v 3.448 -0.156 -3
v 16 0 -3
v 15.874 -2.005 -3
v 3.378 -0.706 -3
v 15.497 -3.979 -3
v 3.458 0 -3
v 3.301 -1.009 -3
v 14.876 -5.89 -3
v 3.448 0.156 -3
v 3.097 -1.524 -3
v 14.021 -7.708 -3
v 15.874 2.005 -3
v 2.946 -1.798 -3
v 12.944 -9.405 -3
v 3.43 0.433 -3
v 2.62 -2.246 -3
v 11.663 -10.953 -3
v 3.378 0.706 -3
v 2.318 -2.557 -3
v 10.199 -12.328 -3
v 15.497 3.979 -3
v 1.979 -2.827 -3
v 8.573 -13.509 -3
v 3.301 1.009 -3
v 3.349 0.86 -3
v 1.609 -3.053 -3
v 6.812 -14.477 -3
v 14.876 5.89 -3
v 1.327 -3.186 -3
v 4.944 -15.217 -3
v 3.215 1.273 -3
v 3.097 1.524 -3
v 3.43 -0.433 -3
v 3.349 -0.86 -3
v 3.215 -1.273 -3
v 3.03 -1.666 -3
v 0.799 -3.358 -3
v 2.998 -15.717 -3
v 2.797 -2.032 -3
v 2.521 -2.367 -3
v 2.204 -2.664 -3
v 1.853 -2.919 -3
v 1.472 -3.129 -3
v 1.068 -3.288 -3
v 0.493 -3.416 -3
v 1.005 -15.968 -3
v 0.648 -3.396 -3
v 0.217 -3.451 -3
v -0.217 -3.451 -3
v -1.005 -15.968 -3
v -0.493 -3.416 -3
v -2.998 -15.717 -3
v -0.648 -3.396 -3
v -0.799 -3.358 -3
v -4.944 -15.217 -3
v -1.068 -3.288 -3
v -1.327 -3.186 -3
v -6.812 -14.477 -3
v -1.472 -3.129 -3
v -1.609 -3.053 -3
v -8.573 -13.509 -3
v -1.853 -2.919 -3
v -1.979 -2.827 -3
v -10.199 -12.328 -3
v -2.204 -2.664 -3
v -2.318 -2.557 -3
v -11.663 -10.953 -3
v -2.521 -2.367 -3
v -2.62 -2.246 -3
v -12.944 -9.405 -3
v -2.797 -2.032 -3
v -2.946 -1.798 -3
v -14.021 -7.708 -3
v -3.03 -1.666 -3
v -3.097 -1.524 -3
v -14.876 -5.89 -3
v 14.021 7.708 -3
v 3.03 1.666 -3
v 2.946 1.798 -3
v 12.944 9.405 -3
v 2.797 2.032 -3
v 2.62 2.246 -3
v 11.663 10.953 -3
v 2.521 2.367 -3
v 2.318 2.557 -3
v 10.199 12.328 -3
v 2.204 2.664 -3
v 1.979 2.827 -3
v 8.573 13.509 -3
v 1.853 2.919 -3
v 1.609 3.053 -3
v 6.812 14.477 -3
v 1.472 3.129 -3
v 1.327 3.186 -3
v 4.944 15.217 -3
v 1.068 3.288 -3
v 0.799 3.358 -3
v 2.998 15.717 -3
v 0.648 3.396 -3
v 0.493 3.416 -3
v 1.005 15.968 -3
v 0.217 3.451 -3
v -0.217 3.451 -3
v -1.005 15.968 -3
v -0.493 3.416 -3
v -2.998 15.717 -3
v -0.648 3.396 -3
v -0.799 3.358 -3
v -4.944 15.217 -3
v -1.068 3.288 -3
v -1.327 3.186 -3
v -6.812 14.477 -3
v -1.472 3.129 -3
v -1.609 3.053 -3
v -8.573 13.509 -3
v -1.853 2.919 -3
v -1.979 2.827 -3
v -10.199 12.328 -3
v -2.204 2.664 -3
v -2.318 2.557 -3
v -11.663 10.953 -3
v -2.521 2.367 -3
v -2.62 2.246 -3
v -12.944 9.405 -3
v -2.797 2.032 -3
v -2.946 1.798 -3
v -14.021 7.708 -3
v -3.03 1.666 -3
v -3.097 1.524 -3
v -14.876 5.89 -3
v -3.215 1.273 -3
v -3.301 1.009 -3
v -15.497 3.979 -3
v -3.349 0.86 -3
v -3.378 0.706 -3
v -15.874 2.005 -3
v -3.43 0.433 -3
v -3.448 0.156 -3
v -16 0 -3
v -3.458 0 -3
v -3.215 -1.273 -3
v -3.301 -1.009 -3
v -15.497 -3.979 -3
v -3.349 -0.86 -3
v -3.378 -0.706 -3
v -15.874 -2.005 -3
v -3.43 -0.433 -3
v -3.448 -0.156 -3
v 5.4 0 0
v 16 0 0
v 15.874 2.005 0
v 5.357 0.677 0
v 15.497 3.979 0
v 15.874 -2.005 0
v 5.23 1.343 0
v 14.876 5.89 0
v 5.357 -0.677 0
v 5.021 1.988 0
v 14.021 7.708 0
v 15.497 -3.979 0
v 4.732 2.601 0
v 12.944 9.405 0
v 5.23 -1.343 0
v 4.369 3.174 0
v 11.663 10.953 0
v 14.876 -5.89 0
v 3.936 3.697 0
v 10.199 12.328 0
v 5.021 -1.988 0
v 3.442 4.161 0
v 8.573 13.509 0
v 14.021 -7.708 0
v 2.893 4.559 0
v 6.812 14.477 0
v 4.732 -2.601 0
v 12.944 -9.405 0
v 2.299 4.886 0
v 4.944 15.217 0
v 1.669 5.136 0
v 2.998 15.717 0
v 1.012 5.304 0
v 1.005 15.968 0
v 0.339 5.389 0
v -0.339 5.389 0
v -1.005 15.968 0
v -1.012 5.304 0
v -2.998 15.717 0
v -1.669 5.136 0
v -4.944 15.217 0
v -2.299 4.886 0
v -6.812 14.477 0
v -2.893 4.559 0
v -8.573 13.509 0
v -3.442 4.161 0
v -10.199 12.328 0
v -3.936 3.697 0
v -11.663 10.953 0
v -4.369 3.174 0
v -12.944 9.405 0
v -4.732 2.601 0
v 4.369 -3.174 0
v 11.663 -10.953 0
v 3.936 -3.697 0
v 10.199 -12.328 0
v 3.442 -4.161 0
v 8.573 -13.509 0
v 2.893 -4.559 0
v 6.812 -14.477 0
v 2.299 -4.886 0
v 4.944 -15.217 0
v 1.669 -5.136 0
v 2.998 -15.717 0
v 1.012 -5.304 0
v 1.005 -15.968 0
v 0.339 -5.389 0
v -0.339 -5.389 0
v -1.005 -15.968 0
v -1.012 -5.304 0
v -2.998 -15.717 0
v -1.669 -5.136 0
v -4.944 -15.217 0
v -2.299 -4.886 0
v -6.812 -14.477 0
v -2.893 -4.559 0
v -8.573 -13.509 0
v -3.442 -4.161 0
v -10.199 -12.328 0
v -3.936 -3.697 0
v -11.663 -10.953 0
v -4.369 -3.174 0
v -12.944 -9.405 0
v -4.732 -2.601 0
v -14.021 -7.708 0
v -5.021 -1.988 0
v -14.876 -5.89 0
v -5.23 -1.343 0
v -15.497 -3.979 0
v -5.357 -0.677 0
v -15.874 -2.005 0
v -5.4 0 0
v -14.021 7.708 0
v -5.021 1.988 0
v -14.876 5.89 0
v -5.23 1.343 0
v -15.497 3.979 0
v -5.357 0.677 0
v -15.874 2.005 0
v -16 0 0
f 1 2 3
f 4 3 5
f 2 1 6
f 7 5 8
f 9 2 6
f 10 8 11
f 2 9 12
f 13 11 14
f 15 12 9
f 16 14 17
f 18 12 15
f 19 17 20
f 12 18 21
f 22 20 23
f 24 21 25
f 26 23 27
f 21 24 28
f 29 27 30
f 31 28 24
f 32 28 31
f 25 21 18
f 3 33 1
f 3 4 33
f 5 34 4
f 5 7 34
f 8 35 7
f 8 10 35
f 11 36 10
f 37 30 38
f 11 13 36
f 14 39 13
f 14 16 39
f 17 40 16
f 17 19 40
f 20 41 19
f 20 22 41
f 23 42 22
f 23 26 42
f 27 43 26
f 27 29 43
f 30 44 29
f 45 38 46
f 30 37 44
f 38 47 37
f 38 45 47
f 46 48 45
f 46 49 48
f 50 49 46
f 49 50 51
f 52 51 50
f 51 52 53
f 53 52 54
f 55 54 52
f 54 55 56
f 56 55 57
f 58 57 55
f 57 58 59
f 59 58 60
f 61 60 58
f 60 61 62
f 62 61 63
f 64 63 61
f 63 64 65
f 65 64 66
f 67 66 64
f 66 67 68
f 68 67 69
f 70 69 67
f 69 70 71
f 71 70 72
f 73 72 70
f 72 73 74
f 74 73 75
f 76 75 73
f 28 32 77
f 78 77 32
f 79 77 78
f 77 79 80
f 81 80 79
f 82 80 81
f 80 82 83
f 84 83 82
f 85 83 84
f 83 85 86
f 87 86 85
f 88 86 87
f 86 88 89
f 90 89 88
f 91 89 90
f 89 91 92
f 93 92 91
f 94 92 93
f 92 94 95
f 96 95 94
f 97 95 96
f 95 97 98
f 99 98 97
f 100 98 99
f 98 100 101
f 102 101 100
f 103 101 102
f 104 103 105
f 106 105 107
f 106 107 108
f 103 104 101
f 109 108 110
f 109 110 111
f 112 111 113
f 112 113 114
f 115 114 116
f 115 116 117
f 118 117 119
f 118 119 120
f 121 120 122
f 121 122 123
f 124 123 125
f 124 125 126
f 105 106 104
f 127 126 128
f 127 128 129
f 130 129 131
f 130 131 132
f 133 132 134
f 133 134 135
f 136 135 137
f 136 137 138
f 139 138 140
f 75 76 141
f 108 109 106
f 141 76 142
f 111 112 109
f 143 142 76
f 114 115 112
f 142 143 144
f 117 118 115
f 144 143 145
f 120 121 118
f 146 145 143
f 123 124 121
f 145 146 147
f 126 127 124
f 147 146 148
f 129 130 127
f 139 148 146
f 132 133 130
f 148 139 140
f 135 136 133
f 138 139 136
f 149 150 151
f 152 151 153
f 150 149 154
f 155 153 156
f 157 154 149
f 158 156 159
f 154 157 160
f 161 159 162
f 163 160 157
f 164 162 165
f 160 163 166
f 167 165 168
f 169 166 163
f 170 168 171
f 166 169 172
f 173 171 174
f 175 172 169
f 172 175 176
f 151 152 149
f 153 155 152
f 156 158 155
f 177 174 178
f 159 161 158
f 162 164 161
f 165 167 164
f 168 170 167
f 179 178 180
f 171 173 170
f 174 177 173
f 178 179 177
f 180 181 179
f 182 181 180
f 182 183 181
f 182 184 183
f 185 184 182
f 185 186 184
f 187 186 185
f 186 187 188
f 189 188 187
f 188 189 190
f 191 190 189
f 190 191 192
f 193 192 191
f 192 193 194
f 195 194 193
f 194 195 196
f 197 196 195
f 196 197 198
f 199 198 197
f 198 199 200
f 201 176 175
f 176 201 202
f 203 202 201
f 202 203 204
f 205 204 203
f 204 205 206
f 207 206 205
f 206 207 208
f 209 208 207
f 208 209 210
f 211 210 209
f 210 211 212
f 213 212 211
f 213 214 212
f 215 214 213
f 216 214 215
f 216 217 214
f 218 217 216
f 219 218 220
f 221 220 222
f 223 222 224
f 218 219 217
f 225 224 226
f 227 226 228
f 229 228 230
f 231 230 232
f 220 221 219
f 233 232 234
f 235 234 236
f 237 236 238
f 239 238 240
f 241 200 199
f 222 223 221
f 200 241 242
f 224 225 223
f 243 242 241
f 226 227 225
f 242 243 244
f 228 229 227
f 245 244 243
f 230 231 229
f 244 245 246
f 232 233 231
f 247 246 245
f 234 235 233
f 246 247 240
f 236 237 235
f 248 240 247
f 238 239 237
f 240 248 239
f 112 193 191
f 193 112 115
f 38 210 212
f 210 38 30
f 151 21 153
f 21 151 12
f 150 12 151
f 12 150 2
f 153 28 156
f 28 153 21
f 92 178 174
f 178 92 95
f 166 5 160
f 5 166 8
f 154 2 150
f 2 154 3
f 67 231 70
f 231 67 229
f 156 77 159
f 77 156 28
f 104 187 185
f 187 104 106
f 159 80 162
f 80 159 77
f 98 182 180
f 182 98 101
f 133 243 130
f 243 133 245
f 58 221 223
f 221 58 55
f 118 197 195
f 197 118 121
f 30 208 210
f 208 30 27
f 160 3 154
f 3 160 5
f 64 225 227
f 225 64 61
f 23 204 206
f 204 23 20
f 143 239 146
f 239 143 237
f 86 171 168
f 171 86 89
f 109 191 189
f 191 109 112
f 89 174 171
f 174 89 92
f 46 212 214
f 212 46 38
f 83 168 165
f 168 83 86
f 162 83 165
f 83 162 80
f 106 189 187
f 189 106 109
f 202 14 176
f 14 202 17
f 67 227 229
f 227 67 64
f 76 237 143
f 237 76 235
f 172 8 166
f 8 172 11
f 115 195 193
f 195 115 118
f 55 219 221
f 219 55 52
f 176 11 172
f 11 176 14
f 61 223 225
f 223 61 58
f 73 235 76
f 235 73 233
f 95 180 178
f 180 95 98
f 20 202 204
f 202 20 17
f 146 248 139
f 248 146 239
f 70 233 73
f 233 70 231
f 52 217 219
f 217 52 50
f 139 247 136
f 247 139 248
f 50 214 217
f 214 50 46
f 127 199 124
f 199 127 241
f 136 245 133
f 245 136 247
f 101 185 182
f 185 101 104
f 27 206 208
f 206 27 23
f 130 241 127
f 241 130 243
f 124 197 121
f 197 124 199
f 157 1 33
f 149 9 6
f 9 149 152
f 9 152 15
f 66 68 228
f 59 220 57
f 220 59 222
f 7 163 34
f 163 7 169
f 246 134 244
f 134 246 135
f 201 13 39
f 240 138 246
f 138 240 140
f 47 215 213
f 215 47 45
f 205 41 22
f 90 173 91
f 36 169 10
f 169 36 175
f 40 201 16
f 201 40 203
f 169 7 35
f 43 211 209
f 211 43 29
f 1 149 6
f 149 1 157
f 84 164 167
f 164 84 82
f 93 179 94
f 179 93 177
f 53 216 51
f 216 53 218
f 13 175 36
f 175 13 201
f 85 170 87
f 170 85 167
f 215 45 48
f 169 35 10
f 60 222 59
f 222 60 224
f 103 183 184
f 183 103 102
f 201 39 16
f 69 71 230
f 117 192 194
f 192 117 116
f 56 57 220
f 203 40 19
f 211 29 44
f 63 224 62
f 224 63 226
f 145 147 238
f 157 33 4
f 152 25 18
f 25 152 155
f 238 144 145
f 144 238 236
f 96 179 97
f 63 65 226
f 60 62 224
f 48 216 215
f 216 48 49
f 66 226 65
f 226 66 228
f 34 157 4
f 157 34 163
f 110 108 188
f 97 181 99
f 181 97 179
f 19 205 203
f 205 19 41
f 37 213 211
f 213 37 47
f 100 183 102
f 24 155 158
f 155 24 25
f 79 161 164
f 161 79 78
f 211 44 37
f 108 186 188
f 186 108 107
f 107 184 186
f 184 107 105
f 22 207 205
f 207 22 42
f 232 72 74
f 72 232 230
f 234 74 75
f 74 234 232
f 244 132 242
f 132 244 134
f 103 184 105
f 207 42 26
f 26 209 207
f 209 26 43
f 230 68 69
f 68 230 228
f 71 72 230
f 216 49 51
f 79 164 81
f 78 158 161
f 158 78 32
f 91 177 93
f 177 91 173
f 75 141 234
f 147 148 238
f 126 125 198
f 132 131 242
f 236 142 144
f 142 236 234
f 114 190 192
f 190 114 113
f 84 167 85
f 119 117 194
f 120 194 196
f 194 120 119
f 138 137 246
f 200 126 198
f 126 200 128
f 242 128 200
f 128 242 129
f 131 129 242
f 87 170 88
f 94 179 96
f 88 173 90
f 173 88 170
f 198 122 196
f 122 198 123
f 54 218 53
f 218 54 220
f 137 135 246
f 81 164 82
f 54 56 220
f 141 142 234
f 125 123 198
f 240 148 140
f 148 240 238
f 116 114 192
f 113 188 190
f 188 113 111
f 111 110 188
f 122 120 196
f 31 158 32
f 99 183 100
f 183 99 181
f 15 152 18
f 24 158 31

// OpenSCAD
$fn = 50;


difference() {
	union() {
		translate(v = [0, 0, -3.0000000000]) {
			cylinder(h = 3, r = 10.0000000000);
		}
		translate(v = [0, 0, -3.0000000000]) {
			cylinder(h = 3, r = 16.0000000000);
		}
	}
	union() {
		translate(v = [0, 0, 0]) {
			rotate(a = [0, 0, 0]) {
				difference() {
					union() {
						#translate(v = [0, 0, -3.0000000000]) {
							cylinder(h = 3, r = 2.6000000000);
						}
						#translate(v = [0, 0, -3.9000000000]) {
							cylinder(h = 3.9000000000, r1 = 2.8750000000, r2 = 5.4000000000);
						}
						#translate(v = [0, 0, -3.0000000000]) {
							cylinder(h = 3, r = 2.8750000000);
						}
						#translate(v = [0, 0, -3.0000000000]) {
							cylinder(h = 3, r = 2.6000000000);
						}
					}
					union();
				}
			}
		}
	}
}
